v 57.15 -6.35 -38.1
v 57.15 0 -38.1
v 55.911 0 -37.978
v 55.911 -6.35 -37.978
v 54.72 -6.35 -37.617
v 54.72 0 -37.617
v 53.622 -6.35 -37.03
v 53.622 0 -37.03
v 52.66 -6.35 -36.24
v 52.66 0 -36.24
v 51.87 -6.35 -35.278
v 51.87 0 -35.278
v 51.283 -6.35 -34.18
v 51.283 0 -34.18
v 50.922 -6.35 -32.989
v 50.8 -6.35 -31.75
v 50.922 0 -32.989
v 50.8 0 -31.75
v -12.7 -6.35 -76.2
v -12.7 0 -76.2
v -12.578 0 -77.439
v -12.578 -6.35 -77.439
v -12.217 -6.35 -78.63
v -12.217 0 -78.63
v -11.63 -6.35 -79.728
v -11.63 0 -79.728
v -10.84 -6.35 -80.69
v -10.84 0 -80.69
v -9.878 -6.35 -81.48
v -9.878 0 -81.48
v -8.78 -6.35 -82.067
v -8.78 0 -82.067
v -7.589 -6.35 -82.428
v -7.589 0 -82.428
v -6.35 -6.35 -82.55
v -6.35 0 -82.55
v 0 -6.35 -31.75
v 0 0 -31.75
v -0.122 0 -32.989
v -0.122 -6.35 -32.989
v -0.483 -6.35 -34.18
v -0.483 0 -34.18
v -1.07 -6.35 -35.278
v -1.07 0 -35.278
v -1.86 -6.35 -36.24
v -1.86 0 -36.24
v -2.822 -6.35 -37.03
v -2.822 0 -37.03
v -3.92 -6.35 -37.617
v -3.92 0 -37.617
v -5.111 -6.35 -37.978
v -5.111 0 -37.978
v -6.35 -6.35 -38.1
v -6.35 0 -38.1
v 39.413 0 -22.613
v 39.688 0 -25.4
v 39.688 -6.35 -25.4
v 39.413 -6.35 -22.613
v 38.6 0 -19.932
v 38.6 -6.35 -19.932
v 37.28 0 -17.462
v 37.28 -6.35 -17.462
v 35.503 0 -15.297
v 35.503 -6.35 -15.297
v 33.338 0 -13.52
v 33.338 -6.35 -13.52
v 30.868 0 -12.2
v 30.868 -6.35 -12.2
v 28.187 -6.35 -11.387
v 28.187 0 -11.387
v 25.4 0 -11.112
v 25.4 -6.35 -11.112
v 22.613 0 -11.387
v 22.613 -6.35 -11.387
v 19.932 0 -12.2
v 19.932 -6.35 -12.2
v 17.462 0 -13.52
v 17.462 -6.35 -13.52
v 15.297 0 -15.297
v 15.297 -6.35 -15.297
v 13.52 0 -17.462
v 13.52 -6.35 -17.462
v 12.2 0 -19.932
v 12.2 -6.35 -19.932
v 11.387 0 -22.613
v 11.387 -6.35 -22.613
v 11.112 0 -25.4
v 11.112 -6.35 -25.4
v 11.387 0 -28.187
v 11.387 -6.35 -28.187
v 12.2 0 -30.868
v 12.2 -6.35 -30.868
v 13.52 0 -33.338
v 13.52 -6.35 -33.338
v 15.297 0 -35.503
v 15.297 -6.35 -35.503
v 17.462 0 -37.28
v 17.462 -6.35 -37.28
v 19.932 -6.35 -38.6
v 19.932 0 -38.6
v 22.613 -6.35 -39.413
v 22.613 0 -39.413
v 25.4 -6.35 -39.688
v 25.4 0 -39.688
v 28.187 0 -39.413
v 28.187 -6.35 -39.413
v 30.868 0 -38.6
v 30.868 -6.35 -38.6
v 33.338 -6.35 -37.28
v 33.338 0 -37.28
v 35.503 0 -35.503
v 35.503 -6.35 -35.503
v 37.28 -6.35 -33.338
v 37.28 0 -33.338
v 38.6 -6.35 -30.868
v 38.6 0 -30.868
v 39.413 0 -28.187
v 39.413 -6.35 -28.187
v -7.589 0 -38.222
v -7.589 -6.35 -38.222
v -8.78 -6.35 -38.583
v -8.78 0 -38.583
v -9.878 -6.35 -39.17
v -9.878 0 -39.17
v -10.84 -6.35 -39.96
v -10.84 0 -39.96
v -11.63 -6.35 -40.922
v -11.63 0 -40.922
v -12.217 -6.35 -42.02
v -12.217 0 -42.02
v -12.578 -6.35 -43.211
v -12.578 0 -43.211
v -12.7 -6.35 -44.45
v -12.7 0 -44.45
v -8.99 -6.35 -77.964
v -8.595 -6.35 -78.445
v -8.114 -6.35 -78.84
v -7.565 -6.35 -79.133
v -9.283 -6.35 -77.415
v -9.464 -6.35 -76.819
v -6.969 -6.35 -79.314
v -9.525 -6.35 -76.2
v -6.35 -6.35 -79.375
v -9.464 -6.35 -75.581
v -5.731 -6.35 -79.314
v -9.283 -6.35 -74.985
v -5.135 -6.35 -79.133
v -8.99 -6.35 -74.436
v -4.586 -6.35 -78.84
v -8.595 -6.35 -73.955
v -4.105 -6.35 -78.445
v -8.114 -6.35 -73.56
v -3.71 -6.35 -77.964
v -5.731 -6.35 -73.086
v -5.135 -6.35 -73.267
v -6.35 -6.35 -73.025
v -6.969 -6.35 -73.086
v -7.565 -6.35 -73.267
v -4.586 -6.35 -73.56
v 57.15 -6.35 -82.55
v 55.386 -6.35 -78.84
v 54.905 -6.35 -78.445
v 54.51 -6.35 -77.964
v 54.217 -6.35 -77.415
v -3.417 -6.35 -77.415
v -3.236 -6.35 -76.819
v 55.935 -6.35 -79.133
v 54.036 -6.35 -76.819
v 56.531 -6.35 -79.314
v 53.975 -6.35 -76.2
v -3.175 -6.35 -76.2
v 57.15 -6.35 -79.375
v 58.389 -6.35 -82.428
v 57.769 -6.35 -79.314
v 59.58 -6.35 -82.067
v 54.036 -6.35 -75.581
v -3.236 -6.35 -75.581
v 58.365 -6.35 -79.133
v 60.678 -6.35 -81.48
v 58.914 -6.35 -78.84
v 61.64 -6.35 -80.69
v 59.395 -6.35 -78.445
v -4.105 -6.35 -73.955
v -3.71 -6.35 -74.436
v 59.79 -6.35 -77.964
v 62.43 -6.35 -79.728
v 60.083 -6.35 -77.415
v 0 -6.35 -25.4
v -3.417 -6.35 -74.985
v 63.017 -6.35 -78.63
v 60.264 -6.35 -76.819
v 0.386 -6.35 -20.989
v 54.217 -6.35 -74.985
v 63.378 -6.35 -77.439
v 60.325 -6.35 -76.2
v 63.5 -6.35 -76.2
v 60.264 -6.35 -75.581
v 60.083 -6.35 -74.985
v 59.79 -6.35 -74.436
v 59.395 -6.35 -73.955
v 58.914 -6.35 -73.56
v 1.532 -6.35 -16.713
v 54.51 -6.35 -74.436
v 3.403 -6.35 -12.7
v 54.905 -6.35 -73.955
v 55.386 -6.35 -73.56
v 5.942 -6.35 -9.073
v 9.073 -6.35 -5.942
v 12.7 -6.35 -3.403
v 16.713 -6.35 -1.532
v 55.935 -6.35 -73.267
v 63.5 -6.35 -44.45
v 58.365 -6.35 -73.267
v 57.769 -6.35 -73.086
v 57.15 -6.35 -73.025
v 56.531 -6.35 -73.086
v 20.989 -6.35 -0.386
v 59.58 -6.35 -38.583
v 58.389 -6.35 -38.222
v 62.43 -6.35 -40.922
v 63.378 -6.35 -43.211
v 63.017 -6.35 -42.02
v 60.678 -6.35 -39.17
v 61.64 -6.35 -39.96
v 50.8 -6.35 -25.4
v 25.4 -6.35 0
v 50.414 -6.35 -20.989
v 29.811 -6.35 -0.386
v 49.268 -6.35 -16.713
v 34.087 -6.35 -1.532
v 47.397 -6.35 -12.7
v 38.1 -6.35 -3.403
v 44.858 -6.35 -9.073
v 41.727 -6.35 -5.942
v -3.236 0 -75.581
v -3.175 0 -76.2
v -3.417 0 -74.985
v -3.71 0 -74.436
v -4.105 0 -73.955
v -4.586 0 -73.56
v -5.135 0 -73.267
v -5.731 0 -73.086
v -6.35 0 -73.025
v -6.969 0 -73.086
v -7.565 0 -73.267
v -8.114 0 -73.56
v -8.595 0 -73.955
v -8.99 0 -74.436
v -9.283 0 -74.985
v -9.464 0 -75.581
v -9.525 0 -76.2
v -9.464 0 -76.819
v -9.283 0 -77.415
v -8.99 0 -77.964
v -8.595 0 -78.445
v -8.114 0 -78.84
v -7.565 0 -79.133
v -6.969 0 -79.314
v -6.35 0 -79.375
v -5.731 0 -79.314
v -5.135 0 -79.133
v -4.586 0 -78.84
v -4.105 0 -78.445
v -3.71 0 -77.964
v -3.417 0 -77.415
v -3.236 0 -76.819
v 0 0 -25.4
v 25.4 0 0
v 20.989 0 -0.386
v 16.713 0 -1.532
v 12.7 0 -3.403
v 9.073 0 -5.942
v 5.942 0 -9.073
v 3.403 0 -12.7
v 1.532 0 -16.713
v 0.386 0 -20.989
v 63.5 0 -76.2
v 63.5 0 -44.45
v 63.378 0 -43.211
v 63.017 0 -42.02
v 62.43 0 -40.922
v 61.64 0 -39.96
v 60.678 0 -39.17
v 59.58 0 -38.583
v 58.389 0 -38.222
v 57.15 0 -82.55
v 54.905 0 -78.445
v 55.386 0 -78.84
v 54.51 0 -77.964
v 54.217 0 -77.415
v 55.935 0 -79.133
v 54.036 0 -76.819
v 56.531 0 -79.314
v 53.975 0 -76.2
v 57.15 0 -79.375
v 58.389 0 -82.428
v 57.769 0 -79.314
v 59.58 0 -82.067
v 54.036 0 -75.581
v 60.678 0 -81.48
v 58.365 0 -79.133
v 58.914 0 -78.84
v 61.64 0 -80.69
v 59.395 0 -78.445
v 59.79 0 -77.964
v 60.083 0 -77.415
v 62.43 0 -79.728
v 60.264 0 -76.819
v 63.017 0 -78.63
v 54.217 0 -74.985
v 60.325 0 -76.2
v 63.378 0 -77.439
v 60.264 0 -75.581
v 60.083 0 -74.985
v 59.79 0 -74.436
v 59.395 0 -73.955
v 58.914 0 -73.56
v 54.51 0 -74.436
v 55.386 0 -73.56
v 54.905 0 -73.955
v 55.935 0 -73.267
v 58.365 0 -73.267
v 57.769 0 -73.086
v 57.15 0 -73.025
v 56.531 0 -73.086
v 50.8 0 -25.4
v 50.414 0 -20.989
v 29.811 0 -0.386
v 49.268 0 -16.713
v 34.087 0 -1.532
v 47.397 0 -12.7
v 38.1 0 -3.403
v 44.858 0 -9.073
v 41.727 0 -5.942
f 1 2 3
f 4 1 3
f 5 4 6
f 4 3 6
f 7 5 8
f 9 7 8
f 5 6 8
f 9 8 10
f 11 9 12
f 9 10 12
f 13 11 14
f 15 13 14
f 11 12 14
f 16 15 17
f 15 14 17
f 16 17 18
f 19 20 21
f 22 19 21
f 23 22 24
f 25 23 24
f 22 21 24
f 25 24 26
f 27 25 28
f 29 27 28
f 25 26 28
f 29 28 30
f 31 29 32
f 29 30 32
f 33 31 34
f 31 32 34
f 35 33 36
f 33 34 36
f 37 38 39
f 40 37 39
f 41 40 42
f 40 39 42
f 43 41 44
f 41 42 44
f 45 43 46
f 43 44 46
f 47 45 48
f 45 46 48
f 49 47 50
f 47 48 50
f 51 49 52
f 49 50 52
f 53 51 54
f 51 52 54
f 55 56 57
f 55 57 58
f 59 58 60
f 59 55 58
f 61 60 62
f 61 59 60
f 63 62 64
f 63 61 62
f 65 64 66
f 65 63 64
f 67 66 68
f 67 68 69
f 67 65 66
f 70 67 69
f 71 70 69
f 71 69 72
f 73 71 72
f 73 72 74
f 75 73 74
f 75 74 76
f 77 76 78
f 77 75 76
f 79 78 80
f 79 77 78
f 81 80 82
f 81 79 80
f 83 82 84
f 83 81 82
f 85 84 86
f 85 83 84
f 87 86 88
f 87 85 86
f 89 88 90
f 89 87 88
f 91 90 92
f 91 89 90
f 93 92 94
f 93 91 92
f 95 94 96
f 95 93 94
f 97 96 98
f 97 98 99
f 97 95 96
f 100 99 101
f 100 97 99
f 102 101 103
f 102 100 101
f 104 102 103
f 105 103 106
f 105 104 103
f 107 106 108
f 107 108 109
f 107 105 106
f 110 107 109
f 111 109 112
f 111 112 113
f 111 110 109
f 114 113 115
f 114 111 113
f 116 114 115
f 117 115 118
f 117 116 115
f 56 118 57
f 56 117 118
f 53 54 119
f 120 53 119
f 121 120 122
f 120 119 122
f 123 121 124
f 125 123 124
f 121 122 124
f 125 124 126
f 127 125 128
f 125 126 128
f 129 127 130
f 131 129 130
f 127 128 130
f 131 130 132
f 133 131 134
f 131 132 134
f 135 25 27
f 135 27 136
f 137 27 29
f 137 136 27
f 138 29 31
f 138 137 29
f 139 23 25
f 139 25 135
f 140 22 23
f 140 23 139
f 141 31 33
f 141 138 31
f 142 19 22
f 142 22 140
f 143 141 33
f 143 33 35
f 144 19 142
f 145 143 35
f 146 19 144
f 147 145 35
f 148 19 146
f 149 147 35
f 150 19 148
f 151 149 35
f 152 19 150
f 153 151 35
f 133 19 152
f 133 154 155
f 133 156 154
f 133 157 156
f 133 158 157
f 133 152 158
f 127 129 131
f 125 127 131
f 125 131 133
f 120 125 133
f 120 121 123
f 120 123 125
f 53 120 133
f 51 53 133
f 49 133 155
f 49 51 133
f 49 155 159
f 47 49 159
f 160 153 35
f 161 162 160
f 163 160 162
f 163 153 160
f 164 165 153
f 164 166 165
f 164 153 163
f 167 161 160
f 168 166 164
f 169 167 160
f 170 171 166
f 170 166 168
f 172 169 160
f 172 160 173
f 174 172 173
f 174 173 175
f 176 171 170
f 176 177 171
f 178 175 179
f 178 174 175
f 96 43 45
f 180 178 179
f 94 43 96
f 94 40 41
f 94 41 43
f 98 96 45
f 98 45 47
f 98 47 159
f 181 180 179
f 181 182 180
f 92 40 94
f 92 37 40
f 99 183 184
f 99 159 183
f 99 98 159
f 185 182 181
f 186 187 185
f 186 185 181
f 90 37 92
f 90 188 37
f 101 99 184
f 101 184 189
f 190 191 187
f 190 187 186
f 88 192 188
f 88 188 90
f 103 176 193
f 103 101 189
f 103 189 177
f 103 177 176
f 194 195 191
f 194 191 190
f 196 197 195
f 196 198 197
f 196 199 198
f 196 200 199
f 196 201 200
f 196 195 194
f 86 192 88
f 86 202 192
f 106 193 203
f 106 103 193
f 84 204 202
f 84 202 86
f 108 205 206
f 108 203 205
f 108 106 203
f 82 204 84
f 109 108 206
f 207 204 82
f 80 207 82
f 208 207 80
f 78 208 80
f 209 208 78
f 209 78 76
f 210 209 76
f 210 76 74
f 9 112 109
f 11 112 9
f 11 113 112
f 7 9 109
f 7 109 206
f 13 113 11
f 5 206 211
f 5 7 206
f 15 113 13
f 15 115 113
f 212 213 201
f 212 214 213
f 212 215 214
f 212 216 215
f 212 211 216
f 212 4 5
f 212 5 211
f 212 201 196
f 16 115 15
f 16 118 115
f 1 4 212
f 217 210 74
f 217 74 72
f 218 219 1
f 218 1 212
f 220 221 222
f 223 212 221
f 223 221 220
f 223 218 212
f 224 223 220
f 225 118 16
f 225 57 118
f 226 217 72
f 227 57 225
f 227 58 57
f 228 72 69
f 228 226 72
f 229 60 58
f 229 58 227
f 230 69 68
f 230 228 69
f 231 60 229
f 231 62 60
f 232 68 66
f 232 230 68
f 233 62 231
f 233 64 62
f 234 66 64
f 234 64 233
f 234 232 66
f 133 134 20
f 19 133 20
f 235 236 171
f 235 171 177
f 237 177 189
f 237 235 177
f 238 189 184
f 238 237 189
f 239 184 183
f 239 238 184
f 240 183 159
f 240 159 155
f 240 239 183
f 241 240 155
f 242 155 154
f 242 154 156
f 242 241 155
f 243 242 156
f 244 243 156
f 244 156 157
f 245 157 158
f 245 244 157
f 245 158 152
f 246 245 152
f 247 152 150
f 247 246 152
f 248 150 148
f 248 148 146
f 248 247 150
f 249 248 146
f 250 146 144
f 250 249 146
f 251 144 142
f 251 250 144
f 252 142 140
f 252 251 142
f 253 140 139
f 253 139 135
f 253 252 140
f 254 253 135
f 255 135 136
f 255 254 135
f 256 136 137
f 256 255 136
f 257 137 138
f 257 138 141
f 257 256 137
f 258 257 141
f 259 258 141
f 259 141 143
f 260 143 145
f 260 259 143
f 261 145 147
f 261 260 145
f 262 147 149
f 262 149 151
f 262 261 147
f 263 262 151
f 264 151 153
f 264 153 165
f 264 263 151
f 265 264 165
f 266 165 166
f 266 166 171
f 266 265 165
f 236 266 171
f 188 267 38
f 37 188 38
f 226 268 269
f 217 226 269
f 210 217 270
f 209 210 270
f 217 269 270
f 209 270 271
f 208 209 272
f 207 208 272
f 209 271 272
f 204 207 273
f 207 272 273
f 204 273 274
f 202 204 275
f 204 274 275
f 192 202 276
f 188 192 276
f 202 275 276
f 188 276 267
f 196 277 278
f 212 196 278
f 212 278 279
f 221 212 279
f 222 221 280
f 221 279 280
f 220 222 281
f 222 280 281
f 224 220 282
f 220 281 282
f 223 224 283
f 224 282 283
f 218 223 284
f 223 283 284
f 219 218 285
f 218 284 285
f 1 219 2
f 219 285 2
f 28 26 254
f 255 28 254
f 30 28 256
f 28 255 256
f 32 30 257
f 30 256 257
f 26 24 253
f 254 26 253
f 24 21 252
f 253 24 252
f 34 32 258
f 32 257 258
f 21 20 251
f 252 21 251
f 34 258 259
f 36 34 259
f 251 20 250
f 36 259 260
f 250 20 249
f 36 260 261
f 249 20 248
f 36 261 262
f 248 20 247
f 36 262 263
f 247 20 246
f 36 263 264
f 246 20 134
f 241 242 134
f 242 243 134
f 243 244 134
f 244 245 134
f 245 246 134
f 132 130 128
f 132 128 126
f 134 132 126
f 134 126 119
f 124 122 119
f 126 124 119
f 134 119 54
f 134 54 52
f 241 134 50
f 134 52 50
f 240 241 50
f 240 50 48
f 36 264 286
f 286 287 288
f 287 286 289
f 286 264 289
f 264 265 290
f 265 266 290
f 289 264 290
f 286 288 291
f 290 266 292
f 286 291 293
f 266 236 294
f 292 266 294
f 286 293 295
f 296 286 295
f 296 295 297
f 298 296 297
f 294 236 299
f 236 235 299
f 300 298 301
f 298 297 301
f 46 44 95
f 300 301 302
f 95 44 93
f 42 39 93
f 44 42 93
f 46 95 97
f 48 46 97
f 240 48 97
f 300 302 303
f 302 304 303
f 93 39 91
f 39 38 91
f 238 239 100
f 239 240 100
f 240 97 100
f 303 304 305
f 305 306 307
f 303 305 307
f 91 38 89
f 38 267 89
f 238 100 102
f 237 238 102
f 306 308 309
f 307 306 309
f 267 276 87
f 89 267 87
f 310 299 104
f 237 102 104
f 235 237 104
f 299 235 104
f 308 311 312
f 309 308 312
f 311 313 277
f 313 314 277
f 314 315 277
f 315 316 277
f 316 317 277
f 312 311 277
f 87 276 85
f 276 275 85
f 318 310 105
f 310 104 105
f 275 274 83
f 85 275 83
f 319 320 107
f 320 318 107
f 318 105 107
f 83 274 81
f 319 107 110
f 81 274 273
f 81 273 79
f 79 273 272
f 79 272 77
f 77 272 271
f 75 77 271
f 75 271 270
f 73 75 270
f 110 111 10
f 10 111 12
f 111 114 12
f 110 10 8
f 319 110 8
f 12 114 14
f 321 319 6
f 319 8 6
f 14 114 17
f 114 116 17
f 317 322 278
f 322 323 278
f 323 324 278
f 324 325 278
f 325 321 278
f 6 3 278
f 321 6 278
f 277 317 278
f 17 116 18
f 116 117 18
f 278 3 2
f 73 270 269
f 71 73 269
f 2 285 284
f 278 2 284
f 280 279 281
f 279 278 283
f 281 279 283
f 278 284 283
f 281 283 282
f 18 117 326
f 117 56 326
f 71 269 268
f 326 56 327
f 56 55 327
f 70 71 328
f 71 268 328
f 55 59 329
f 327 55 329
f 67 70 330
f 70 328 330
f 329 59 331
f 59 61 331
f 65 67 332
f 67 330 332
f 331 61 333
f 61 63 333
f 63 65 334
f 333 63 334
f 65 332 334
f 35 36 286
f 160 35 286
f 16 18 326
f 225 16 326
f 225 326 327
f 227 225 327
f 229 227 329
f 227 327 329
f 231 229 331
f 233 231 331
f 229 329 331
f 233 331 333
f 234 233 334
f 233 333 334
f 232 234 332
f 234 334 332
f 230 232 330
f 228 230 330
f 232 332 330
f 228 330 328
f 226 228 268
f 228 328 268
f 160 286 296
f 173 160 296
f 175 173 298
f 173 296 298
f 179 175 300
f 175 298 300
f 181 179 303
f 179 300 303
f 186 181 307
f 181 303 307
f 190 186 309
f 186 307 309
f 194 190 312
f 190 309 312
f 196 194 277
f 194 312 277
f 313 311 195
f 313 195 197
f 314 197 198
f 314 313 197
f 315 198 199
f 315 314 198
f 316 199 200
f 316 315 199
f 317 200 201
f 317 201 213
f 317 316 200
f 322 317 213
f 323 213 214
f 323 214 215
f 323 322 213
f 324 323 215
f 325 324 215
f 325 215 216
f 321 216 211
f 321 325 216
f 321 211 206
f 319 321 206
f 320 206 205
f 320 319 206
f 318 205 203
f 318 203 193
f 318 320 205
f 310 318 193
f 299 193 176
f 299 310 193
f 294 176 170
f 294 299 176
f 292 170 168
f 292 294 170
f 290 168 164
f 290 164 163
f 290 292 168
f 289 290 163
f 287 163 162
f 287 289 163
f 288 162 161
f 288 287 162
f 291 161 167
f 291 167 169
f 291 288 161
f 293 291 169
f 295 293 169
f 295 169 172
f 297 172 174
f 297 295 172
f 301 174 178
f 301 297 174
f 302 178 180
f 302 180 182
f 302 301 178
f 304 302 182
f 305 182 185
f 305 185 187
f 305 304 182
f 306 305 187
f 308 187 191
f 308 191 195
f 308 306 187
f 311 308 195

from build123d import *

# Parameters (mm, degrees)
F0_R     = 14.2875
F0_R_2   = 3.175
F1_DEPTH = 6.35


with BuildPart() as f1:
    # F0 (on Front) → F1 (new body)
    with BuildSketch(Plane.XZ):
        with BuildLine():
            Line((-6.35, -63.5), (0, -63.5))
            Line((0, -63.5), (50.8, -63.5))
            Line((50.8, -63.5), (57.15, -63.5))
            ThreePointArc((57.15, -63.5), (61.640128, -61.640128), (63.5, -57.15))
            Line((63.5, -57.15), (63.5, -44.45))
            ThreePointArc((63.5, -44.45), (61.640128, -39.959872), (57.15, -38.1))
            ThreePointArc((57.15, -38.1), (52.659872, -36.240128), (50.8, -31.75))
            Line((50.8, -31.75), (50.8, -25.4))
            ThreePointArc((50.8, -25.4), (43.360512, -7.439488), (25.4, 0))
            ThreePointArc((25.4, 0), (7.439488, -7.439488), (0, -25.4))
            Line((0, -25.4), (0, -31.75))
            ThreePointArc((0, -31.75), (-1.859872, -36.240128), (-6.35, -38.1))
            ThreePointArc((-6.35, -38.1), (-10.840128, -39.959872), (-12.7, -44.45))
            Line((-12.7, -44.45), (-12.7, -57.15))
            ThreePointArc((-12.7, -57.15), (-10.840128, -61.640128), (-6.35, -63.5))
        make_face()
        with Locations((25.4, -25.4)):
            Circle(F0_R, mode=Mode.SUBTRACT)
        with BuildLine():
            Line((50.8, -63.5), (0, -63.5))
            Line((0, -63.5), (-6.35, -63.5))
            ThreePointArc((-6.35, -63.5), (-10.840128, -61.640128), (-12.7, -57.15))
            Line((-12.7, -57.15), (-12.7, -76.2))
            ThreePointArc((-12.7, -76.2), (-10.840128, -80.690128), (-6.35, -82.55))
            Line((-6.35, -82.55), (57.15, -82.55))
            ThreePointArc((57.15, -82.55), (61.640128, -80.690128), (63.5, -76.2))
            Line((63.5, -76.2), (63.5, -57.15))
            ThreePointArc((63.5, -57.15), (61.640128, -61.640128), (57.15, -63.5))
            Line((57.15, -63.5), (50.8, -63.5))
        make_face()
        with Locations((-6.35, -76.2)):
            Circle(F0_R_2, mode=Mode.SUBTRACT)
        with Locations((57.15, -76.2)):
            Circle(F0_R_2, mode=Mode.SUBTRACT)
    extrude(amount=F1_DEPTH)


solid = f1.part
